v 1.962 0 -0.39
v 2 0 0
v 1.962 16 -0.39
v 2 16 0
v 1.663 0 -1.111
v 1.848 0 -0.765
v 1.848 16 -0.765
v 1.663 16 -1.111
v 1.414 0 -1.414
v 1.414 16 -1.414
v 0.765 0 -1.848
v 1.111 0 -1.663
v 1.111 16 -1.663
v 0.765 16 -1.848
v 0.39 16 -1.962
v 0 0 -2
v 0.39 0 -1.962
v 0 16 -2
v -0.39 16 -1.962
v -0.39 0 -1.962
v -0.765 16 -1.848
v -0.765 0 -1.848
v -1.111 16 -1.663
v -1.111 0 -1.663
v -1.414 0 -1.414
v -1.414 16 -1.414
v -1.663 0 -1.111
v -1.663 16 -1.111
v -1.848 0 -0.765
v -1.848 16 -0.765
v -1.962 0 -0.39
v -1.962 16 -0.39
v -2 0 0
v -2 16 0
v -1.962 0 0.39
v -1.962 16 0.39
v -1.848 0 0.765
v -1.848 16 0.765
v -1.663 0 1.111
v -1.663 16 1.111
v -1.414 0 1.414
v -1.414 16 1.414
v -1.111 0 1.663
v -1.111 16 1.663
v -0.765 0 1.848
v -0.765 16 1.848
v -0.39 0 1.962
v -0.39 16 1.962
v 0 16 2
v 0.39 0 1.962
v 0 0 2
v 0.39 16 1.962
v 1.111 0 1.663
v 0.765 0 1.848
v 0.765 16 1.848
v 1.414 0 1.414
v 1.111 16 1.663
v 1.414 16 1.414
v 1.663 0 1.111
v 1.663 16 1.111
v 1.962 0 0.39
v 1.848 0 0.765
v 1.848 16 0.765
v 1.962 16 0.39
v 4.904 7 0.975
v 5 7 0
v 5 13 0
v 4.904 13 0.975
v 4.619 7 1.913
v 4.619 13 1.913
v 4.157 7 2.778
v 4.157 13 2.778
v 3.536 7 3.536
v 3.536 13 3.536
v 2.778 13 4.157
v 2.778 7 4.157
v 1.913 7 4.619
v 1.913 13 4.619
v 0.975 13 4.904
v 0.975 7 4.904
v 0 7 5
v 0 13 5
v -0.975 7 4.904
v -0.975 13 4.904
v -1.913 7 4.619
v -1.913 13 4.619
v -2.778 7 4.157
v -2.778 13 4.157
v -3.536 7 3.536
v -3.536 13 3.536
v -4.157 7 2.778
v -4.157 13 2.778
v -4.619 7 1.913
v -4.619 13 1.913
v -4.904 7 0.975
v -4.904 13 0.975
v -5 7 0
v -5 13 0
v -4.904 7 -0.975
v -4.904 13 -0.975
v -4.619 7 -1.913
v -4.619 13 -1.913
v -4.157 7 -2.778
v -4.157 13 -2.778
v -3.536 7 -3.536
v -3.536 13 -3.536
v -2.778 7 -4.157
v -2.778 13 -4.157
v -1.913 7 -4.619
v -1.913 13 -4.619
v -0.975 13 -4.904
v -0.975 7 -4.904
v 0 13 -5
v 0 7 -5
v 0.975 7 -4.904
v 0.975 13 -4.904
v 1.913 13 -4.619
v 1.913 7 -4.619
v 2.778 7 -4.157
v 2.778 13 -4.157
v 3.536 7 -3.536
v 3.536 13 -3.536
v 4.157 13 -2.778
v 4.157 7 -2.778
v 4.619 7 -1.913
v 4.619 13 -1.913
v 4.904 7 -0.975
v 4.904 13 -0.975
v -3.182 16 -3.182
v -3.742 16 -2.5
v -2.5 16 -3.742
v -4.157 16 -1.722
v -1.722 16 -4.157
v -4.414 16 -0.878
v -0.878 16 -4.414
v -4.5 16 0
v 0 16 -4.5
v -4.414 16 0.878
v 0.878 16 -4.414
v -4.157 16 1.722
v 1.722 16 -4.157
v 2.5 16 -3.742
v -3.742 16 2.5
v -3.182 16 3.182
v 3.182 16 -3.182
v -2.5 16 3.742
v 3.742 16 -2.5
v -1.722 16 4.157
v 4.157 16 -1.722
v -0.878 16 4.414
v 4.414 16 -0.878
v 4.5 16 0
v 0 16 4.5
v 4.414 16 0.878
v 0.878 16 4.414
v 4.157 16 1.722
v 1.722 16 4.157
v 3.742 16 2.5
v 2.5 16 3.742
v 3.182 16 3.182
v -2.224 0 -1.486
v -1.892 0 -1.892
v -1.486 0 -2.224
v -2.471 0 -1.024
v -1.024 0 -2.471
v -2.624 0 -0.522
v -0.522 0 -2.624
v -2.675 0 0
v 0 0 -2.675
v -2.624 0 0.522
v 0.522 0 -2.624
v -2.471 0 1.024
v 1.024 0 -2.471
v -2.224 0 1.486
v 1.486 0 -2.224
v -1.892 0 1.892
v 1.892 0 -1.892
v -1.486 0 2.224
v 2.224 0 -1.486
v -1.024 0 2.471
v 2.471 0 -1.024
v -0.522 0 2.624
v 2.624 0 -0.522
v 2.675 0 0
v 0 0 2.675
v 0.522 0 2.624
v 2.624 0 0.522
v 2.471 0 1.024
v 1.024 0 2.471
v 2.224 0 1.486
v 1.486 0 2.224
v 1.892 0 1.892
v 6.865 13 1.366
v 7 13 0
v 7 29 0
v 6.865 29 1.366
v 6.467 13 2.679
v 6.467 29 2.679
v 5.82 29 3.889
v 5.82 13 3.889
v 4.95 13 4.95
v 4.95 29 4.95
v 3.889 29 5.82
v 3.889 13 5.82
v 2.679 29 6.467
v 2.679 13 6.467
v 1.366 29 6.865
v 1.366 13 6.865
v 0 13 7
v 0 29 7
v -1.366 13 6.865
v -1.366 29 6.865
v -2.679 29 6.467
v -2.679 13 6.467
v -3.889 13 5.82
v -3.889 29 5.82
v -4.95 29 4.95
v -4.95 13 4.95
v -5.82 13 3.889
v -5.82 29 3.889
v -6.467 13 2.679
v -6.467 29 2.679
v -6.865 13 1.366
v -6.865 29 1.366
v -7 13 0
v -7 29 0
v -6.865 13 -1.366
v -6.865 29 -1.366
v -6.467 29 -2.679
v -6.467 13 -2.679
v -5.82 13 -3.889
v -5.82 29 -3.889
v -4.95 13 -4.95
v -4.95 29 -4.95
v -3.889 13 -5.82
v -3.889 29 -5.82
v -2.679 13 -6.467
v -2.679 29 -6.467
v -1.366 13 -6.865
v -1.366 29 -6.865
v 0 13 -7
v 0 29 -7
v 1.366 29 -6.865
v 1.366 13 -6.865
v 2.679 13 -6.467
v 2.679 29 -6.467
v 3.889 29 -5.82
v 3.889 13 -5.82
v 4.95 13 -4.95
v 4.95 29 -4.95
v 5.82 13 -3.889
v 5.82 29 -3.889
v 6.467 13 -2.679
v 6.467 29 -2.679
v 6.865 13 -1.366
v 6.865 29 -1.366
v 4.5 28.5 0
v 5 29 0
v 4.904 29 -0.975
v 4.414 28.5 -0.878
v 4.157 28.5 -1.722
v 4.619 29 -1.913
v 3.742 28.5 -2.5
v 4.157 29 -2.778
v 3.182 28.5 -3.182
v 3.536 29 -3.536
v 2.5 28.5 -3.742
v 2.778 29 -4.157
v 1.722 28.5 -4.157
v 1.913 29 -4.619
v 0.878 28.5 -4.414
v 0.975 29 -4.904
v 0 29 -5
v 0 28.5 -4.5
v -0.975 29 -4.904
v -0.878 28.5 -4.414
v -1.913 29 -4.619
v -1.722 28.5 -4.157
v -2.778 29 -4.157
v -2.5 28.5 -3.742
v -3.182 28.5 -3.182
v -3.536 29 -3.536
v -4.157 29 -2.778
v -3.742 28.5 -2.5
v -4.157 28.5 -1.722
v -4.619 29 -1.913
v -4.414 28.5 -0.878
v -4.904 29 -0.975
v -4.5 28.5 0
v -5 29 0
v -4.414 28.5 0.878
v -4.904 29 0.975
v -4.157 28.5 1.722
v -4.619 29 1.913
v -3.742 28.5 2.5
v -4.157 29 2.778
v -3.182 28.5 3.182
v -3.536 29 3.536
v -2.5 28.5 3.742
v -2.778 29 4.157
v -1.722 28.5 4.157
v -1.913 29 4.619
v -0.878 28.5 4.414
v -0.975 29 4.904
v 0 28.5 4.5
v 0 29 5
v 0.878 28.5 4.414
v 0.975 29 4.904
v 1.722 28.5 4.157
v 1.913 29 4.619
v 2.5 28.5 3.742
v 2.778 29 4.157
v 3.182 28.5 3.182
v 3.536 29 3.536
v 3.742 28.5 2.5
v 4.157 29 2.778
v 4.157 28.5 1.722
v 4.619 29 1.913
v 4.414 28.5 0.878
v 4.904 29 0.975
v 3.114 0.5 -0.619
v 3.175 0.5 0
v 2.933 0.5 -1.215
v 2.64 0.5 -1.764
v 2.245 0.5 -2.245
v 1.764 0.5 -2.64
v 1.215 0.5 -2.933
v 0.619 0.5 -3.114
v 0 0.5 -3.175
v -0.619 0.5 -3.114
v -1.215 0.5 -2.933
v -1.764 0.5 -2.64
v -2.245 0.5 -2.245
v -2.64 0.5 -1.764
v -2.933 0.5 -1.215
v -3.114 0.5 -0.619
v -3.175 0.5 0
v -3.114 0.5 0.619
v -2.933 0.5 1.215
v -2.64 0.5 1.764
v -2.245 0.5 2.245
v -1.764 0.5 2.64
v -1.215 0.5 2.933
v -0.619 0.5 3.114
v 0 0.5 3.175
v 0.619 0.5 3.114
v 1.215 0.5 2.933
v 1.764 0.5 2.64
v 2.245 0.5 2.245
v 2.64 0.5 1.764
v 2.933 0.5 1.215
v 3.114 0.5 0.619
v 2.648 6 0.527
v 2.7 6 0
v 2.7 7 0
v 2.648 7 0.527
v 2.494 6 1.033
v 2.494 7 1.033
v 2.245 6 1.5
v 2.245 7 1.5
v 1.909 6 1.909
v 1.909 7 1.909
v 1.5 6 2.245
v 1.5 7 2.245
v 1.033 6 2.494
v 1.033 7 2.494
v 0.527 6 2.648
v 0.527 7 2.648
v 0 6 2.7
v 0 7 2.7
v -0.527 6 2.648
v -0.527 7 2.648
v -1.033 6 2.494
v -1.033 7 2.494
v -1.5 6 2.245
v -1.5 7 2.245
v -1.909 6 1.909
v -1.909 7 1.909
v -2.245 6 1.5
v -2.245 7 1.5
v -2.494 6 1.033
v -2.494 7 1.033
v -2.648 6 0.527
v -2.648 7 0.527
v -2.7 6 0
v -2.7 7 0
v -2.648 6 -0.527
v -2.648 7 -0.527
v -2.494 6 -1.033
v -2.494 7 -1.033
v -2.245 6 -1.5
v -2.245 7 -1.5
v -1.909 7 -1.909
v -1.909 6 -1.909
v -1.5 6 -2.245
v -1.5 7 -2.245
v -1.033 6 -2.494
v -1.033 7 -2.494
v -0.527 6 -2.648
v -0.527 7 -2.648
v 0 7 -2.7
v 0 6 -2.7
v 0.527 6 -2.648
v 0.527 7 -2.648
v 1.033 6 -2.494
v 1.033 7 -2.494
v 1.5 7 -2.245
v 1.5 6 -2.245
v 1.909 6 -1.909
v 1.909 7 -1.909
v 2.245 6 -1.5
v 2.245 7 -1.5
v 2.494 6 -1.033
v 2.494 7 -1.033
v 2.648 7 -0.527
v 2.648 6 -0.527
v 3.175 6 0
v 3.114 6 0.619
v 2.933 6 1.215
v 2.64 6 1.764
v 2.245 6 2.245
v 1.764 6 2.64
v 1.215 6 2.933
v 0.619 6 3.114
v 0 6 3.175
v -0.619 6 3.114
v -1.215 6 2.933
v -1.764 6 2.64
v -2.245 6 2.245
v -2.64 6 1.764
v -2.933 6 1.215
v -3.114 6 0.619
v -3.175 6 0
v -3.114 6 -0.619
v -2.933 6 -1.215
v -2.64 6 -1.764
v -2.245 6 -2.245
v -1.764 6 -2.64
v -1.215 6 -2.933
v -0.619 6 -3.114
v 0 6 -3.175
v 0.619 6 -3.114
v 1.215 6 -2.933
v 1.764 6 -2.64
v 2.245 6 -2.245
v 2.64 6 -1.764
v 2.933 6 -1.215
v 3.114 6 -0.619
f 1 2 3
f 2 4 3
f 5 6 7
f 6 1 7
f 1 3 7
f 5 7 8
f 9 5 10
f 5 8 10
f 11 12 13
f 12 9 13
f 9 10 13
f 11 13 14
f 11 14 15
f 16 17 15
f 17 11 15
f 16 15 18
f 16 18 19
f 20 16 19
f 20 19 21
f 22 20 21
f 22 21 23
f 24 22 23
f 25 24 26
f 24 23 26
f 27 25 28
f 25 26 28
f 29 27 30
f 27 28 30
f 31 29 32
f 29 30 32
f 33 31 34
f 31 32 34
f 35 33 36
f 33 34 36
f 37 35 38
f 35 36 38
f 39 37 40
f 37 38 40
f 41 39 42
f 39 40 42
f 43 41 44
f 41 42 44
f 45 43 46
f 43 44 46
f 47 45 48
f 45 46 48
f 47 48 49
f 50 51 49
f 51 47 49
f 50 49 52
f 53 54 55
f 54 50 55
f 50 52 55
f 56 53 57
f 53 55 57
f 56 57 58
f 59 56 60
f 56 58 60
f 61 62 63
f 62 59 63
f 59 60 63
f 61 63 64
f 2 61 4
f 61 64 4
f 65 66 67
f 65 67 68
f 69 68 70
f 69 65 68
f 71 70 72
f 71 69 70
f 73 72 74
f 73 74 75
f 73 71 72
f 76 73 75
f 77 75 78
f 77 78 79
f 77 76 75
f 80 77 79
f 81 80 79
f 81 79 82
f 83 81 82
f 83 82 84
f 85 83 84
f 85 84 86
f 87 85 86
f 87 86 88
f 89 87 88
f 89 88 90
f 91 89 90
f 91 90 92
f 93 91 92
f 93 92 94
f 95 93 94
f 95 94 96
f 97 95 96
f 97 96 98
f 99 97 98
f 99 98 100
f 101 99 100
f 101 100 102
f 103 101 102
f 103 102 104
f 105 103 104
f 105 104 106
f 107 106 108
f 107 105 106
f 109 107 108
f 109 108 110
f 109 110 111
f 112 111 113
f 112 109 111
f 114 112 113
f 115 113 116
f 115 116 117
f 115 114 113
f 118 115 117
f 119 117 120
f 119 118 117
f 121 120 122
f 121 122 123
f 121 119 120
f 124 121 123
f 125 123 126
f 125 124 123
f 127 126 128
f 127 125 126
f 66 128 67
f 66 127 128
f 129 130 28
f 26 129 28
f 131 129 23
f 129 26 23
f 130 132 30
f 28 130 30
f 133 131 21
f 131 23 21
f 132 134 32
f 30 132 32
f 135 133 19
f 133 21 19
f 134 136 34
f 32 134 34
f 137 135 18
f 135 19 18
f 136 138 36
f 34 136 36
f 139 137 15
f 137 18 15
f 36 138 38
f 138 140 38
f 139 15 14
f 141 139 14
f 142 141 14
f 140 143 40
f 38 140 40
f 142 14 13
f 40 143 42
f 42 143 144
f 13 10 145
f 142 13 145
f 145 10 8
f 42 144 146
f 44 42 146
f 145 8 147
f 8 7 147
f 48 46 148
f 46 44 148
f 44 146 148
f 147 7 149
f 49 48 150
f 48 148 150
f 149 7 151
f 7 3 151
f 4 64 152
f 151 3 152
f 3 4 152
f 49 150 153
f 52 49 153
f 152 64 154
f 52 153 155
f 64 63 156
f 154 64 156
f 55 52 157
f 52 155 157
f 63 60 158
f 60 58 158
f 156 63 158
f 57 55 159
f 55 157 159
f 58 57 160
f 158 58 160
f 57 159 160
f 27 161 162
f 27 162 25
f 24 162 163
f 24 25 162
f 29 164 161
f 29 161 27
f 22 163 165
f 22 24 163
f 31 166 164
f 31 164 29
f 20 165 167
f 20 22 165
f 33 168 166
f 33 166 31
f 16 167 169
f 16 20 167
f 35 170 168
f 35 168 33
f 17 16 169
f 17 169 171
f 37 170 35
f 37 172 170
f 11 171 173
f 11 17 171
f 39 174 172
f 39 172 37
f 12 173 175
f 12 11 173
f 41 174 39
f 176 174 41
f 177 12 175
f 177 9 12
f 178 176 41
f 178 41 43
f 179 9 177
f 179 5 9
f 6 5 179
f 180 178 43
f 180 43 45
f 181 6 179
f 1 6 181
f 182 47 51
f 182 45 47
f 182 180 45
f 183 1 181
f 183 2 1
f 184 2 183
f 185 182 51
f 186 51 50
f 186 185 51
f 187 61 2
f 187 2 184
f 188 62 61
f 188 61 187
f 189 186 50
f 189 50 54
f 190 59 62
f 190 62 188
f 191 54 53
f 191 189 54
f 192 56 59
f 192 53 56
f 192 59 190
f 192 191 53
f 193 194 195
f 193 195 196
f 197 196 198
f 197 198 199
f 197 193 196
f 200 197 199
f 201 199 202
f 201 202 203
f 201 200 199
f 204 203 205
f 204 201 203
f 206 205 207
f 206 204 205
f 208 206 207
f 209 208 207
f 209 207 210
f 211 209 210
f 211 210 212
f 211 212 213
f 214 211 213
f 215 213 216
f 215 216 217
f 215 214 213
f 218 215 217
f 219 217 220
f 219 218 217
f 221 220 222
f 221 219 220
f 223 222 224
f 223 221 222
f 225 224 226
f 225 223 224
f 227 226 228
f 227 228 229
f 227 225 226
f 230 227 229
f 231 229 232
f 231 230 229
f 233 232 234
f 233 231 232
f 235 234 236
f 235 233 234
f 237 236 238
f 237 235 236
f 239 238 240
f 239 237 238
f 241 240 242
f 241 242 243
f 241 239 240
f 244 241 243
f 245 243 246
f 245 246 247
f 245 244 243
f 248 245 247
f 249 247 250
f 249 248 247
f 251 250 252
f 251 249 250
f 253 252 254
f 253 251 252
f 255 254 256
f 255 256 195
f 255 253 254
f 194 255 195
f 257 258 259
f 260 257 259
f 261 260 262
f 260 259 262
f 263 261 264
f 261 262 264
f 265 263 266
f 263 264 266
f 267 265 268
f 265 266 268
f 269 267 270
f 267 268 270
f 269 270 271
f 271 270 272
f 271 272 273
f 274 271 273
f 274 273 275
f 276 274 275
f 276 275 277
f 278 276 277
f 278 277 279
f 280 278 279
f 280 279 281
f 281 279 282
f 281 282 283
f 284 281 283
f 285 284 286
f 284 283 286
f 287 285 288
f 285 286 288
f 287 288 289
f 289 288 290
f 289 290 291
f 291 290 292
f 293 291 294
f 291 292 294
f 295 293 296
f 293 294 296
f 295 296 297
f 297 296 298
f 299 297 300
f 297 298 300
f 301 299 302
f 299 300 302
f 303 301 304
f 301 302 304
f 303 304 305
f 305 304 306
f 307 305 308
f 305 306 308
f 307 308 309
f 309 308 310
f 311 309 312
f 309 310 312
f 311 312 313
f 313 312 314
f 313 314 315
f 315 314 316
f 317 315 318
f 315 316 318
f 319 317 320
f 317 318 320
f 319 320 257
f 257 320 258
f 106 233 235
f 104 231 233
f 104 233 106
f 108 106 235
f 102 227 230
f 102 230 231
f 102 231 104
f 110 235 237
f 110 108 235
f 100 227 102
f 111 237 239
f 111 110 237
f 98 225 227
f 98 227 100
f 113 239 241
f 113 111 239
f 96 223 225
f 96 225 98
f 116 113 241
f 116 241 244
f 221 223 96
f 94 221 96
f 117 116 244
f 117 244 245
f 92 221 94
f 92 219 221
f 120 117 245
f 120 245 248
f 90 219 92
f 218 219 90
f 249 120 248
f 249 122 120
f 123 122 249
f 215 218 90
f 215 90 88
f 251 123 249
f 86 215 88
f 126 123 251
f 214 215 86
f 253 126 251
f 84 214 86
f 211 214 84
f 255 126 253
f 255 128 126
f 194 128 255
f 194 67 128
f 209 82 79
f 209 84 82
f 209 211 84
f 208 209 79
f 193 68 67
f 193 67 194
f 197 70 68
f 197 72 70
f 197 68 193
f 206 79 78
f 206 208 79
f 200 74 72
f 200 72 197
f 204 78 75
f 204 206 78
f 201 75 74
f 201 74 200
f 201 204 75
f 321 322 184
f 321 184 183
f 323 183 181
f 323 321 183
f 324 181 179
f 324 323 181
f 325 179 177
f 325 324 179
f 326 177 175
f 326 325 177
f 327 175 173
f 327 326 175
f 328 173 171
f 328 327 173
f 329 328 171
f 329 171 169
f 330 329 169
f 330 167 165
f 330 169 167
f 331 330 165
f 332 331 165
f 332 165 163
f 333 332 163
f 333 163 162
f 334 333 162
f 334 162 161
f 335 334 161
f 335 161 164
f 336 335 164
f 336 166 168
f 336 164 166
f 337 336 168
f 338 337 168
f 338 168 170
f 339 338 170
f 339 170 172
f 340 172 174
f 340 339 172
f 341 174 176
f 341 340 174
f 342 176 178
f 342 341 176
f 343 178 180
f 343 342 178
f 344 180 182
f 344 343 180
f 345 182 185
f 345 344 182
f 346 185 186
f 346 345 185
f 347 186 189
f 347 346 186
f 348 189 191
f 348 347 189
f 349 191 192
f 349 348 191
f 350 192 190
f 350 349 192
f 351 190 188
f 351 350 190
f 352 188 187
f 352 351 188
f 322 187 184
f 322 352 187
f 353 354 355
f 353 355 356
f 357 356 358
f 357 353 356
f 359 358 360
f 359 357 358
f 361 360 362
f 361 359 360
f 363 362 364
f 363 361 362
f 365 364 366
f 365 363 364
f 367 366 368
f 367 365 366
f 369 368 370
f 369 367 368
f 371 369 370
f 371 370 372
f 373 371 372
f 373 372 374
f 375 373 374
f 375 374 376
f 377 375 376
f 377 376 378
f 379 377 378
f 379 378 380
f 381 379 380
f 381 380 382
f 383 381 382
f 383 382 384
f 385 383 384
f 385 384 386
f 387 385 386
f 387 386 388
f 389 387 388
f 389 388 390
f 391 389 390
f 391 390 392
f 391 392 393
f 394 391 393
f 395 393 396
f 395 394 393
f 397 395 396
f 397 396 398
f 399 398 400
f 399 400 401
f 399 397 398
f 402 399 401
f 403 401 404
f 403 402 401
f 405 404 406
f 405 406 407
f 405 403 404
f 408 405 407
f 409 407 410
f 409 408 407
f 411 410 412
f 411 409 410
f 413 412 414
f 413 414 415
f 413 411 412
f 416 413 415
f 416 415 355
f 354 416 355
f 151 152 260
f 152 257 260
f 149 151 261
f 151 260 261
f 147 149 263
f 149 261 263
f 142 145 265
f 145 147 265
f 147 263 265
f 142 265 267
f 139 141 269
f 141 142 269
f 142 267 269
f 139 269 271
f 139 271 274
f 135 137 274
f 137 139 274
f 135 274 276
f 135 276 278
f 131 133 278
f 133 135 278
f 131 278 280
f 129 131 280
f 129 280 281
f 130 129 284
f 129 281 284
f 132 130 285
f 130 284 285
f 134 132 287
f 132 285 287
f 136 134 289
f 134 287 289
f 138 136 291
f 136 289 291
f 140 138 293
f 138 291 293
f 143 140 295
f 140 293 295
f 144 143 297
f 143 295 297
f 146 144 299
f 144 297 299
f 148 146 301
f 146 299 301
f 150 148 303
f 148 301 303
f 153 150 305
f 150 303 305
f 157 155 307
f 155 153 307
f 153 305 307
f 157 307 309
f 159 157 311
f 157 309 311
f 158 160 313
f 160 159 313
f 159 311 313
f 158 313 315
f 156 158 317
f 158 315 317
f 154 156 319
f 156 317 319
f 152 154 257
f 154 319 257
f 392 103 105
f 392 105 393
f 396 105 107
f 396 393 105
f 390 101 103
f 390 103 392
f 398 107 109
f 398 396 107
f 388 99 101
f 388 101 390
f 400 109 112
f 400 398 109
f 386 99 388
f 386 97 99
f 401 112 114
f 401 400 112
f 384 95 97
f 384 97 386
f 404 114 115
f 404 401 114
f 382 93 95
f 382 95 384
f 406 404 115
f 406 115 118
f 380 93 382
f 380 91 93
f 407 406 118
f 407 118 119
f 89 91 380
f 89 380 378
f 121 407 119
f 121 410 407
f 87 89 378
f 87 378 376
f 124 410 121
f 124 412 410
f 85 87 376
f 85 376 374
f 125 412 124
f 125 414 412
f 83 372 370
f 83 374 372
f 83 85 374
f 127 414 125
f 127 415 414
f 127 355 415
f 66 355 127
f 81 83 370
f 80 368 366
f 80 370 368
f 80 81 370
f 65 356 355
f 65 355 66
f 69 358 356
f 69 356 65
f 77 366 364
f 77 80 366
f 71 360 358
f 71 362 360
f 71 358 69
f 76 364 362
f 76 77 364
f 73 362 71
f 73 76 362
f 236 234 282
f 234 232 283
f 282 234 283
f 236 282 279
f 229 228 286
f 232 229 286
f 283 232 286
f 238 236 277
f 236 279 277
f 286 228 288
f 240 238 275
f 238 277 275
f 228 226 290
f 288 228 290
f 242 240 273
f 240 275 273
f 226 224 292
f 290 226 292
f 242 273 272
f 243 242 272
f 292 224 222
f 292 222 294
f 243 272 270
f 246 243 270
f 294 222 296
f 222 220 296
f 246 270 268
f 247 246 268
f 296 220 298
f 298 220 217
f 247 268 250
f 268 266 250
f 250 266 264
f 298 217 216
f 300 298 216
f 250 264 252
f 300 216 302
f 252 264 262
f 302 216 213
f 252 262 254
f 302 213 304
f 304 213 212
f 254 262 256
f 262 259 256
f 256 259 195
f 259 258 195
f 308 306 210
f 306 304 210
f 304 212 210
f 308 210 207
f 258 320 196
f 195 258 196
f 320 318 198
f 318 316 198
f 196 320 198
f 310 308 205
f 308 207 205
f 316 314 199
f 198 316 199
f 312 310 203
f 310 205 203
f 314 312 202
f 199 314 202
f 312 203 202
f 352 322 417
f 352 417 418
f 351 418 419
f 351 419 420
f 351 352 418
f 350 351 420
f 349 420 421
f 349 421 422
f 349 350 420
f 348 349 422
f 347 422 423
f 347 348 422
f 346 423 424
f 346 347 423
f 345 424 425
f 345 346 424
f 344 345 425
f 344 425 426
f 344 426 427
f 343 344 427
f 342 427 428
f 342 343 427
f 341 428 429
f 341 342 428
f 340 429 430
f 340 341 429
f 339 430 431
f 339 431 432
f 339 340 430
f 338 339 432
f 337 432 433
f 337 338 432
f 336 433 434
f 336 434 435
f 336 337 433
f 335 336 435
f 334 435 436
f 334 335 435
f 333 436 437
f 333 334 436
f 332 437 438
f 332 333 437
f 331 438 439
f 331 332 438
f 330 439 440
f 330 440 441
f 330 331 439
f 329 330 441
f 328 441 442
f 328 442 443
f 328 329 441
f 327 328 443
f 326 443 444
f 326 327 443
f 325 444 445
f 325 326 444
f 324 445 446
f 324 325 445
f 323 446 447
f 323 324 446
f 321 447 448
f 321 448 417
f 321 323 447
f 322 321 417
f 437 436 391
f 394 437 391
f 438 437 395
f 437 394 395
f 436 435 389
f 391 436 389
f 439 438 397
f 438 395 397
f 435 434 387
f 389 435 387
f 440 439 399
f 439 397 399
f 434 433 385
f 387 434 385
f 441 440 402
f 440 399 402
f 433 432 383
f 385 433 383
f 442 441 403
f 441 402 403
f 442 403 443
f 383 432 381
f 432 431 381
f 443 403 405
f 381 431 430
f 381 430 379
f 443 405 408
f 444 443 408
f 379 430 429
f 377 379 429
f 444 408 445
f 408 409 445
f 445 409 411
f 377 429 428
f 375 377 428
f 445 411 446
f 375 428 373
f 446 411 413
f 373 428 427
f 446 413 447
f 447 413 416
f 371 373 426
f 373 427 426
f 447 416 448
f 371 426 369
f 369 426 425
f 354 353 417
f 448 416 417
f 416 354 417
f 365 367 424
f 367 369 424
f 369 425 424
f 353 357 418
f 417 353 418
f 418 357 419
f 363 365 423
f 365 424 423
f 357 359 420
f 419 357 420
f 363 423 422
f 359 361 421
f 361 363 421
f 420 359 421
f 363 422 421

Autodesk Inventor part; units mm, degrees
ref_plane "YZ Plane" through (0, 0, 0) normal (1, 0, 0) x (0, 1, 0)
ref_plane "XZ Plane" through (0, 0, 0) normal (0, 1, 0) x (-1, 0, 0)
ref_plane "XY Plane" through (0, 0, 0) normal (0, 0, 1) x (1, 0, 0)
sketch "Skizze1" plane through (0, 0, 0) normal (0, 0, 1) x (1, 0, 0)
  line L0 (0, 34.8) -> (0, -5.8) projected
  line L1 (-1.4, 0) -> (8.4, 0) projected
  line L2 (2, 0) -> (2, 16)
  line L3 (2, 16) -> (4.5, 16)
  line L4 (4.5, 16) -> (4.5, 29)
  line L5 (4.5, 29) -> (7, 29)
  line L6 (7, 29) -> (7, 13)
  line L7 (3.175, 6) -> (3.175, 0)
  line L8 (2, 0) -> (3.175, 0)
  line L9 (5, 7) -> (2.7, 7)
  line L10 (2.7, 7) -> (2.7, 6)
  line L11 (2.7, 6) -> (3.175, 6)
  line L12 (7, 13) -> (5, 13)
  line L13 (5, 13) -> (5, 7)
  point P0 (0, 0)
  dimension "d1" = 1
  dimension "d2" = 2.7
  dimension "d3" = 3.175
  dimension "d4" = 2
  dimension "d5" = 4.5
  dimension "d6" = 13
  dimension "d7" = 7
  dimension "d8" = 5
  dimension "d9" = 6
  dimension "d10" = 3
  dimension "d11" = 7
revolve "Umdrehung1" add sketch "Skizze1" angle 360 about axis through (0, 0, 0) along (0, -1, 0)
chamfer "Fase1" distance 0.5 angle 45 2 edges at (-3.175, 0, 0) (-4.5, 29, 0)
thread "Gewinde1" size "G9.728x0.907" designation "G 1/8" standard "ISO Pipe Threads" full length
thread "Gewinde2" size "1/4-28 UNF" class "2A" standard "ANSI Unified Screw Threads" full length
properties part number "Gewindeadapter" material "Aluminum-6061"
